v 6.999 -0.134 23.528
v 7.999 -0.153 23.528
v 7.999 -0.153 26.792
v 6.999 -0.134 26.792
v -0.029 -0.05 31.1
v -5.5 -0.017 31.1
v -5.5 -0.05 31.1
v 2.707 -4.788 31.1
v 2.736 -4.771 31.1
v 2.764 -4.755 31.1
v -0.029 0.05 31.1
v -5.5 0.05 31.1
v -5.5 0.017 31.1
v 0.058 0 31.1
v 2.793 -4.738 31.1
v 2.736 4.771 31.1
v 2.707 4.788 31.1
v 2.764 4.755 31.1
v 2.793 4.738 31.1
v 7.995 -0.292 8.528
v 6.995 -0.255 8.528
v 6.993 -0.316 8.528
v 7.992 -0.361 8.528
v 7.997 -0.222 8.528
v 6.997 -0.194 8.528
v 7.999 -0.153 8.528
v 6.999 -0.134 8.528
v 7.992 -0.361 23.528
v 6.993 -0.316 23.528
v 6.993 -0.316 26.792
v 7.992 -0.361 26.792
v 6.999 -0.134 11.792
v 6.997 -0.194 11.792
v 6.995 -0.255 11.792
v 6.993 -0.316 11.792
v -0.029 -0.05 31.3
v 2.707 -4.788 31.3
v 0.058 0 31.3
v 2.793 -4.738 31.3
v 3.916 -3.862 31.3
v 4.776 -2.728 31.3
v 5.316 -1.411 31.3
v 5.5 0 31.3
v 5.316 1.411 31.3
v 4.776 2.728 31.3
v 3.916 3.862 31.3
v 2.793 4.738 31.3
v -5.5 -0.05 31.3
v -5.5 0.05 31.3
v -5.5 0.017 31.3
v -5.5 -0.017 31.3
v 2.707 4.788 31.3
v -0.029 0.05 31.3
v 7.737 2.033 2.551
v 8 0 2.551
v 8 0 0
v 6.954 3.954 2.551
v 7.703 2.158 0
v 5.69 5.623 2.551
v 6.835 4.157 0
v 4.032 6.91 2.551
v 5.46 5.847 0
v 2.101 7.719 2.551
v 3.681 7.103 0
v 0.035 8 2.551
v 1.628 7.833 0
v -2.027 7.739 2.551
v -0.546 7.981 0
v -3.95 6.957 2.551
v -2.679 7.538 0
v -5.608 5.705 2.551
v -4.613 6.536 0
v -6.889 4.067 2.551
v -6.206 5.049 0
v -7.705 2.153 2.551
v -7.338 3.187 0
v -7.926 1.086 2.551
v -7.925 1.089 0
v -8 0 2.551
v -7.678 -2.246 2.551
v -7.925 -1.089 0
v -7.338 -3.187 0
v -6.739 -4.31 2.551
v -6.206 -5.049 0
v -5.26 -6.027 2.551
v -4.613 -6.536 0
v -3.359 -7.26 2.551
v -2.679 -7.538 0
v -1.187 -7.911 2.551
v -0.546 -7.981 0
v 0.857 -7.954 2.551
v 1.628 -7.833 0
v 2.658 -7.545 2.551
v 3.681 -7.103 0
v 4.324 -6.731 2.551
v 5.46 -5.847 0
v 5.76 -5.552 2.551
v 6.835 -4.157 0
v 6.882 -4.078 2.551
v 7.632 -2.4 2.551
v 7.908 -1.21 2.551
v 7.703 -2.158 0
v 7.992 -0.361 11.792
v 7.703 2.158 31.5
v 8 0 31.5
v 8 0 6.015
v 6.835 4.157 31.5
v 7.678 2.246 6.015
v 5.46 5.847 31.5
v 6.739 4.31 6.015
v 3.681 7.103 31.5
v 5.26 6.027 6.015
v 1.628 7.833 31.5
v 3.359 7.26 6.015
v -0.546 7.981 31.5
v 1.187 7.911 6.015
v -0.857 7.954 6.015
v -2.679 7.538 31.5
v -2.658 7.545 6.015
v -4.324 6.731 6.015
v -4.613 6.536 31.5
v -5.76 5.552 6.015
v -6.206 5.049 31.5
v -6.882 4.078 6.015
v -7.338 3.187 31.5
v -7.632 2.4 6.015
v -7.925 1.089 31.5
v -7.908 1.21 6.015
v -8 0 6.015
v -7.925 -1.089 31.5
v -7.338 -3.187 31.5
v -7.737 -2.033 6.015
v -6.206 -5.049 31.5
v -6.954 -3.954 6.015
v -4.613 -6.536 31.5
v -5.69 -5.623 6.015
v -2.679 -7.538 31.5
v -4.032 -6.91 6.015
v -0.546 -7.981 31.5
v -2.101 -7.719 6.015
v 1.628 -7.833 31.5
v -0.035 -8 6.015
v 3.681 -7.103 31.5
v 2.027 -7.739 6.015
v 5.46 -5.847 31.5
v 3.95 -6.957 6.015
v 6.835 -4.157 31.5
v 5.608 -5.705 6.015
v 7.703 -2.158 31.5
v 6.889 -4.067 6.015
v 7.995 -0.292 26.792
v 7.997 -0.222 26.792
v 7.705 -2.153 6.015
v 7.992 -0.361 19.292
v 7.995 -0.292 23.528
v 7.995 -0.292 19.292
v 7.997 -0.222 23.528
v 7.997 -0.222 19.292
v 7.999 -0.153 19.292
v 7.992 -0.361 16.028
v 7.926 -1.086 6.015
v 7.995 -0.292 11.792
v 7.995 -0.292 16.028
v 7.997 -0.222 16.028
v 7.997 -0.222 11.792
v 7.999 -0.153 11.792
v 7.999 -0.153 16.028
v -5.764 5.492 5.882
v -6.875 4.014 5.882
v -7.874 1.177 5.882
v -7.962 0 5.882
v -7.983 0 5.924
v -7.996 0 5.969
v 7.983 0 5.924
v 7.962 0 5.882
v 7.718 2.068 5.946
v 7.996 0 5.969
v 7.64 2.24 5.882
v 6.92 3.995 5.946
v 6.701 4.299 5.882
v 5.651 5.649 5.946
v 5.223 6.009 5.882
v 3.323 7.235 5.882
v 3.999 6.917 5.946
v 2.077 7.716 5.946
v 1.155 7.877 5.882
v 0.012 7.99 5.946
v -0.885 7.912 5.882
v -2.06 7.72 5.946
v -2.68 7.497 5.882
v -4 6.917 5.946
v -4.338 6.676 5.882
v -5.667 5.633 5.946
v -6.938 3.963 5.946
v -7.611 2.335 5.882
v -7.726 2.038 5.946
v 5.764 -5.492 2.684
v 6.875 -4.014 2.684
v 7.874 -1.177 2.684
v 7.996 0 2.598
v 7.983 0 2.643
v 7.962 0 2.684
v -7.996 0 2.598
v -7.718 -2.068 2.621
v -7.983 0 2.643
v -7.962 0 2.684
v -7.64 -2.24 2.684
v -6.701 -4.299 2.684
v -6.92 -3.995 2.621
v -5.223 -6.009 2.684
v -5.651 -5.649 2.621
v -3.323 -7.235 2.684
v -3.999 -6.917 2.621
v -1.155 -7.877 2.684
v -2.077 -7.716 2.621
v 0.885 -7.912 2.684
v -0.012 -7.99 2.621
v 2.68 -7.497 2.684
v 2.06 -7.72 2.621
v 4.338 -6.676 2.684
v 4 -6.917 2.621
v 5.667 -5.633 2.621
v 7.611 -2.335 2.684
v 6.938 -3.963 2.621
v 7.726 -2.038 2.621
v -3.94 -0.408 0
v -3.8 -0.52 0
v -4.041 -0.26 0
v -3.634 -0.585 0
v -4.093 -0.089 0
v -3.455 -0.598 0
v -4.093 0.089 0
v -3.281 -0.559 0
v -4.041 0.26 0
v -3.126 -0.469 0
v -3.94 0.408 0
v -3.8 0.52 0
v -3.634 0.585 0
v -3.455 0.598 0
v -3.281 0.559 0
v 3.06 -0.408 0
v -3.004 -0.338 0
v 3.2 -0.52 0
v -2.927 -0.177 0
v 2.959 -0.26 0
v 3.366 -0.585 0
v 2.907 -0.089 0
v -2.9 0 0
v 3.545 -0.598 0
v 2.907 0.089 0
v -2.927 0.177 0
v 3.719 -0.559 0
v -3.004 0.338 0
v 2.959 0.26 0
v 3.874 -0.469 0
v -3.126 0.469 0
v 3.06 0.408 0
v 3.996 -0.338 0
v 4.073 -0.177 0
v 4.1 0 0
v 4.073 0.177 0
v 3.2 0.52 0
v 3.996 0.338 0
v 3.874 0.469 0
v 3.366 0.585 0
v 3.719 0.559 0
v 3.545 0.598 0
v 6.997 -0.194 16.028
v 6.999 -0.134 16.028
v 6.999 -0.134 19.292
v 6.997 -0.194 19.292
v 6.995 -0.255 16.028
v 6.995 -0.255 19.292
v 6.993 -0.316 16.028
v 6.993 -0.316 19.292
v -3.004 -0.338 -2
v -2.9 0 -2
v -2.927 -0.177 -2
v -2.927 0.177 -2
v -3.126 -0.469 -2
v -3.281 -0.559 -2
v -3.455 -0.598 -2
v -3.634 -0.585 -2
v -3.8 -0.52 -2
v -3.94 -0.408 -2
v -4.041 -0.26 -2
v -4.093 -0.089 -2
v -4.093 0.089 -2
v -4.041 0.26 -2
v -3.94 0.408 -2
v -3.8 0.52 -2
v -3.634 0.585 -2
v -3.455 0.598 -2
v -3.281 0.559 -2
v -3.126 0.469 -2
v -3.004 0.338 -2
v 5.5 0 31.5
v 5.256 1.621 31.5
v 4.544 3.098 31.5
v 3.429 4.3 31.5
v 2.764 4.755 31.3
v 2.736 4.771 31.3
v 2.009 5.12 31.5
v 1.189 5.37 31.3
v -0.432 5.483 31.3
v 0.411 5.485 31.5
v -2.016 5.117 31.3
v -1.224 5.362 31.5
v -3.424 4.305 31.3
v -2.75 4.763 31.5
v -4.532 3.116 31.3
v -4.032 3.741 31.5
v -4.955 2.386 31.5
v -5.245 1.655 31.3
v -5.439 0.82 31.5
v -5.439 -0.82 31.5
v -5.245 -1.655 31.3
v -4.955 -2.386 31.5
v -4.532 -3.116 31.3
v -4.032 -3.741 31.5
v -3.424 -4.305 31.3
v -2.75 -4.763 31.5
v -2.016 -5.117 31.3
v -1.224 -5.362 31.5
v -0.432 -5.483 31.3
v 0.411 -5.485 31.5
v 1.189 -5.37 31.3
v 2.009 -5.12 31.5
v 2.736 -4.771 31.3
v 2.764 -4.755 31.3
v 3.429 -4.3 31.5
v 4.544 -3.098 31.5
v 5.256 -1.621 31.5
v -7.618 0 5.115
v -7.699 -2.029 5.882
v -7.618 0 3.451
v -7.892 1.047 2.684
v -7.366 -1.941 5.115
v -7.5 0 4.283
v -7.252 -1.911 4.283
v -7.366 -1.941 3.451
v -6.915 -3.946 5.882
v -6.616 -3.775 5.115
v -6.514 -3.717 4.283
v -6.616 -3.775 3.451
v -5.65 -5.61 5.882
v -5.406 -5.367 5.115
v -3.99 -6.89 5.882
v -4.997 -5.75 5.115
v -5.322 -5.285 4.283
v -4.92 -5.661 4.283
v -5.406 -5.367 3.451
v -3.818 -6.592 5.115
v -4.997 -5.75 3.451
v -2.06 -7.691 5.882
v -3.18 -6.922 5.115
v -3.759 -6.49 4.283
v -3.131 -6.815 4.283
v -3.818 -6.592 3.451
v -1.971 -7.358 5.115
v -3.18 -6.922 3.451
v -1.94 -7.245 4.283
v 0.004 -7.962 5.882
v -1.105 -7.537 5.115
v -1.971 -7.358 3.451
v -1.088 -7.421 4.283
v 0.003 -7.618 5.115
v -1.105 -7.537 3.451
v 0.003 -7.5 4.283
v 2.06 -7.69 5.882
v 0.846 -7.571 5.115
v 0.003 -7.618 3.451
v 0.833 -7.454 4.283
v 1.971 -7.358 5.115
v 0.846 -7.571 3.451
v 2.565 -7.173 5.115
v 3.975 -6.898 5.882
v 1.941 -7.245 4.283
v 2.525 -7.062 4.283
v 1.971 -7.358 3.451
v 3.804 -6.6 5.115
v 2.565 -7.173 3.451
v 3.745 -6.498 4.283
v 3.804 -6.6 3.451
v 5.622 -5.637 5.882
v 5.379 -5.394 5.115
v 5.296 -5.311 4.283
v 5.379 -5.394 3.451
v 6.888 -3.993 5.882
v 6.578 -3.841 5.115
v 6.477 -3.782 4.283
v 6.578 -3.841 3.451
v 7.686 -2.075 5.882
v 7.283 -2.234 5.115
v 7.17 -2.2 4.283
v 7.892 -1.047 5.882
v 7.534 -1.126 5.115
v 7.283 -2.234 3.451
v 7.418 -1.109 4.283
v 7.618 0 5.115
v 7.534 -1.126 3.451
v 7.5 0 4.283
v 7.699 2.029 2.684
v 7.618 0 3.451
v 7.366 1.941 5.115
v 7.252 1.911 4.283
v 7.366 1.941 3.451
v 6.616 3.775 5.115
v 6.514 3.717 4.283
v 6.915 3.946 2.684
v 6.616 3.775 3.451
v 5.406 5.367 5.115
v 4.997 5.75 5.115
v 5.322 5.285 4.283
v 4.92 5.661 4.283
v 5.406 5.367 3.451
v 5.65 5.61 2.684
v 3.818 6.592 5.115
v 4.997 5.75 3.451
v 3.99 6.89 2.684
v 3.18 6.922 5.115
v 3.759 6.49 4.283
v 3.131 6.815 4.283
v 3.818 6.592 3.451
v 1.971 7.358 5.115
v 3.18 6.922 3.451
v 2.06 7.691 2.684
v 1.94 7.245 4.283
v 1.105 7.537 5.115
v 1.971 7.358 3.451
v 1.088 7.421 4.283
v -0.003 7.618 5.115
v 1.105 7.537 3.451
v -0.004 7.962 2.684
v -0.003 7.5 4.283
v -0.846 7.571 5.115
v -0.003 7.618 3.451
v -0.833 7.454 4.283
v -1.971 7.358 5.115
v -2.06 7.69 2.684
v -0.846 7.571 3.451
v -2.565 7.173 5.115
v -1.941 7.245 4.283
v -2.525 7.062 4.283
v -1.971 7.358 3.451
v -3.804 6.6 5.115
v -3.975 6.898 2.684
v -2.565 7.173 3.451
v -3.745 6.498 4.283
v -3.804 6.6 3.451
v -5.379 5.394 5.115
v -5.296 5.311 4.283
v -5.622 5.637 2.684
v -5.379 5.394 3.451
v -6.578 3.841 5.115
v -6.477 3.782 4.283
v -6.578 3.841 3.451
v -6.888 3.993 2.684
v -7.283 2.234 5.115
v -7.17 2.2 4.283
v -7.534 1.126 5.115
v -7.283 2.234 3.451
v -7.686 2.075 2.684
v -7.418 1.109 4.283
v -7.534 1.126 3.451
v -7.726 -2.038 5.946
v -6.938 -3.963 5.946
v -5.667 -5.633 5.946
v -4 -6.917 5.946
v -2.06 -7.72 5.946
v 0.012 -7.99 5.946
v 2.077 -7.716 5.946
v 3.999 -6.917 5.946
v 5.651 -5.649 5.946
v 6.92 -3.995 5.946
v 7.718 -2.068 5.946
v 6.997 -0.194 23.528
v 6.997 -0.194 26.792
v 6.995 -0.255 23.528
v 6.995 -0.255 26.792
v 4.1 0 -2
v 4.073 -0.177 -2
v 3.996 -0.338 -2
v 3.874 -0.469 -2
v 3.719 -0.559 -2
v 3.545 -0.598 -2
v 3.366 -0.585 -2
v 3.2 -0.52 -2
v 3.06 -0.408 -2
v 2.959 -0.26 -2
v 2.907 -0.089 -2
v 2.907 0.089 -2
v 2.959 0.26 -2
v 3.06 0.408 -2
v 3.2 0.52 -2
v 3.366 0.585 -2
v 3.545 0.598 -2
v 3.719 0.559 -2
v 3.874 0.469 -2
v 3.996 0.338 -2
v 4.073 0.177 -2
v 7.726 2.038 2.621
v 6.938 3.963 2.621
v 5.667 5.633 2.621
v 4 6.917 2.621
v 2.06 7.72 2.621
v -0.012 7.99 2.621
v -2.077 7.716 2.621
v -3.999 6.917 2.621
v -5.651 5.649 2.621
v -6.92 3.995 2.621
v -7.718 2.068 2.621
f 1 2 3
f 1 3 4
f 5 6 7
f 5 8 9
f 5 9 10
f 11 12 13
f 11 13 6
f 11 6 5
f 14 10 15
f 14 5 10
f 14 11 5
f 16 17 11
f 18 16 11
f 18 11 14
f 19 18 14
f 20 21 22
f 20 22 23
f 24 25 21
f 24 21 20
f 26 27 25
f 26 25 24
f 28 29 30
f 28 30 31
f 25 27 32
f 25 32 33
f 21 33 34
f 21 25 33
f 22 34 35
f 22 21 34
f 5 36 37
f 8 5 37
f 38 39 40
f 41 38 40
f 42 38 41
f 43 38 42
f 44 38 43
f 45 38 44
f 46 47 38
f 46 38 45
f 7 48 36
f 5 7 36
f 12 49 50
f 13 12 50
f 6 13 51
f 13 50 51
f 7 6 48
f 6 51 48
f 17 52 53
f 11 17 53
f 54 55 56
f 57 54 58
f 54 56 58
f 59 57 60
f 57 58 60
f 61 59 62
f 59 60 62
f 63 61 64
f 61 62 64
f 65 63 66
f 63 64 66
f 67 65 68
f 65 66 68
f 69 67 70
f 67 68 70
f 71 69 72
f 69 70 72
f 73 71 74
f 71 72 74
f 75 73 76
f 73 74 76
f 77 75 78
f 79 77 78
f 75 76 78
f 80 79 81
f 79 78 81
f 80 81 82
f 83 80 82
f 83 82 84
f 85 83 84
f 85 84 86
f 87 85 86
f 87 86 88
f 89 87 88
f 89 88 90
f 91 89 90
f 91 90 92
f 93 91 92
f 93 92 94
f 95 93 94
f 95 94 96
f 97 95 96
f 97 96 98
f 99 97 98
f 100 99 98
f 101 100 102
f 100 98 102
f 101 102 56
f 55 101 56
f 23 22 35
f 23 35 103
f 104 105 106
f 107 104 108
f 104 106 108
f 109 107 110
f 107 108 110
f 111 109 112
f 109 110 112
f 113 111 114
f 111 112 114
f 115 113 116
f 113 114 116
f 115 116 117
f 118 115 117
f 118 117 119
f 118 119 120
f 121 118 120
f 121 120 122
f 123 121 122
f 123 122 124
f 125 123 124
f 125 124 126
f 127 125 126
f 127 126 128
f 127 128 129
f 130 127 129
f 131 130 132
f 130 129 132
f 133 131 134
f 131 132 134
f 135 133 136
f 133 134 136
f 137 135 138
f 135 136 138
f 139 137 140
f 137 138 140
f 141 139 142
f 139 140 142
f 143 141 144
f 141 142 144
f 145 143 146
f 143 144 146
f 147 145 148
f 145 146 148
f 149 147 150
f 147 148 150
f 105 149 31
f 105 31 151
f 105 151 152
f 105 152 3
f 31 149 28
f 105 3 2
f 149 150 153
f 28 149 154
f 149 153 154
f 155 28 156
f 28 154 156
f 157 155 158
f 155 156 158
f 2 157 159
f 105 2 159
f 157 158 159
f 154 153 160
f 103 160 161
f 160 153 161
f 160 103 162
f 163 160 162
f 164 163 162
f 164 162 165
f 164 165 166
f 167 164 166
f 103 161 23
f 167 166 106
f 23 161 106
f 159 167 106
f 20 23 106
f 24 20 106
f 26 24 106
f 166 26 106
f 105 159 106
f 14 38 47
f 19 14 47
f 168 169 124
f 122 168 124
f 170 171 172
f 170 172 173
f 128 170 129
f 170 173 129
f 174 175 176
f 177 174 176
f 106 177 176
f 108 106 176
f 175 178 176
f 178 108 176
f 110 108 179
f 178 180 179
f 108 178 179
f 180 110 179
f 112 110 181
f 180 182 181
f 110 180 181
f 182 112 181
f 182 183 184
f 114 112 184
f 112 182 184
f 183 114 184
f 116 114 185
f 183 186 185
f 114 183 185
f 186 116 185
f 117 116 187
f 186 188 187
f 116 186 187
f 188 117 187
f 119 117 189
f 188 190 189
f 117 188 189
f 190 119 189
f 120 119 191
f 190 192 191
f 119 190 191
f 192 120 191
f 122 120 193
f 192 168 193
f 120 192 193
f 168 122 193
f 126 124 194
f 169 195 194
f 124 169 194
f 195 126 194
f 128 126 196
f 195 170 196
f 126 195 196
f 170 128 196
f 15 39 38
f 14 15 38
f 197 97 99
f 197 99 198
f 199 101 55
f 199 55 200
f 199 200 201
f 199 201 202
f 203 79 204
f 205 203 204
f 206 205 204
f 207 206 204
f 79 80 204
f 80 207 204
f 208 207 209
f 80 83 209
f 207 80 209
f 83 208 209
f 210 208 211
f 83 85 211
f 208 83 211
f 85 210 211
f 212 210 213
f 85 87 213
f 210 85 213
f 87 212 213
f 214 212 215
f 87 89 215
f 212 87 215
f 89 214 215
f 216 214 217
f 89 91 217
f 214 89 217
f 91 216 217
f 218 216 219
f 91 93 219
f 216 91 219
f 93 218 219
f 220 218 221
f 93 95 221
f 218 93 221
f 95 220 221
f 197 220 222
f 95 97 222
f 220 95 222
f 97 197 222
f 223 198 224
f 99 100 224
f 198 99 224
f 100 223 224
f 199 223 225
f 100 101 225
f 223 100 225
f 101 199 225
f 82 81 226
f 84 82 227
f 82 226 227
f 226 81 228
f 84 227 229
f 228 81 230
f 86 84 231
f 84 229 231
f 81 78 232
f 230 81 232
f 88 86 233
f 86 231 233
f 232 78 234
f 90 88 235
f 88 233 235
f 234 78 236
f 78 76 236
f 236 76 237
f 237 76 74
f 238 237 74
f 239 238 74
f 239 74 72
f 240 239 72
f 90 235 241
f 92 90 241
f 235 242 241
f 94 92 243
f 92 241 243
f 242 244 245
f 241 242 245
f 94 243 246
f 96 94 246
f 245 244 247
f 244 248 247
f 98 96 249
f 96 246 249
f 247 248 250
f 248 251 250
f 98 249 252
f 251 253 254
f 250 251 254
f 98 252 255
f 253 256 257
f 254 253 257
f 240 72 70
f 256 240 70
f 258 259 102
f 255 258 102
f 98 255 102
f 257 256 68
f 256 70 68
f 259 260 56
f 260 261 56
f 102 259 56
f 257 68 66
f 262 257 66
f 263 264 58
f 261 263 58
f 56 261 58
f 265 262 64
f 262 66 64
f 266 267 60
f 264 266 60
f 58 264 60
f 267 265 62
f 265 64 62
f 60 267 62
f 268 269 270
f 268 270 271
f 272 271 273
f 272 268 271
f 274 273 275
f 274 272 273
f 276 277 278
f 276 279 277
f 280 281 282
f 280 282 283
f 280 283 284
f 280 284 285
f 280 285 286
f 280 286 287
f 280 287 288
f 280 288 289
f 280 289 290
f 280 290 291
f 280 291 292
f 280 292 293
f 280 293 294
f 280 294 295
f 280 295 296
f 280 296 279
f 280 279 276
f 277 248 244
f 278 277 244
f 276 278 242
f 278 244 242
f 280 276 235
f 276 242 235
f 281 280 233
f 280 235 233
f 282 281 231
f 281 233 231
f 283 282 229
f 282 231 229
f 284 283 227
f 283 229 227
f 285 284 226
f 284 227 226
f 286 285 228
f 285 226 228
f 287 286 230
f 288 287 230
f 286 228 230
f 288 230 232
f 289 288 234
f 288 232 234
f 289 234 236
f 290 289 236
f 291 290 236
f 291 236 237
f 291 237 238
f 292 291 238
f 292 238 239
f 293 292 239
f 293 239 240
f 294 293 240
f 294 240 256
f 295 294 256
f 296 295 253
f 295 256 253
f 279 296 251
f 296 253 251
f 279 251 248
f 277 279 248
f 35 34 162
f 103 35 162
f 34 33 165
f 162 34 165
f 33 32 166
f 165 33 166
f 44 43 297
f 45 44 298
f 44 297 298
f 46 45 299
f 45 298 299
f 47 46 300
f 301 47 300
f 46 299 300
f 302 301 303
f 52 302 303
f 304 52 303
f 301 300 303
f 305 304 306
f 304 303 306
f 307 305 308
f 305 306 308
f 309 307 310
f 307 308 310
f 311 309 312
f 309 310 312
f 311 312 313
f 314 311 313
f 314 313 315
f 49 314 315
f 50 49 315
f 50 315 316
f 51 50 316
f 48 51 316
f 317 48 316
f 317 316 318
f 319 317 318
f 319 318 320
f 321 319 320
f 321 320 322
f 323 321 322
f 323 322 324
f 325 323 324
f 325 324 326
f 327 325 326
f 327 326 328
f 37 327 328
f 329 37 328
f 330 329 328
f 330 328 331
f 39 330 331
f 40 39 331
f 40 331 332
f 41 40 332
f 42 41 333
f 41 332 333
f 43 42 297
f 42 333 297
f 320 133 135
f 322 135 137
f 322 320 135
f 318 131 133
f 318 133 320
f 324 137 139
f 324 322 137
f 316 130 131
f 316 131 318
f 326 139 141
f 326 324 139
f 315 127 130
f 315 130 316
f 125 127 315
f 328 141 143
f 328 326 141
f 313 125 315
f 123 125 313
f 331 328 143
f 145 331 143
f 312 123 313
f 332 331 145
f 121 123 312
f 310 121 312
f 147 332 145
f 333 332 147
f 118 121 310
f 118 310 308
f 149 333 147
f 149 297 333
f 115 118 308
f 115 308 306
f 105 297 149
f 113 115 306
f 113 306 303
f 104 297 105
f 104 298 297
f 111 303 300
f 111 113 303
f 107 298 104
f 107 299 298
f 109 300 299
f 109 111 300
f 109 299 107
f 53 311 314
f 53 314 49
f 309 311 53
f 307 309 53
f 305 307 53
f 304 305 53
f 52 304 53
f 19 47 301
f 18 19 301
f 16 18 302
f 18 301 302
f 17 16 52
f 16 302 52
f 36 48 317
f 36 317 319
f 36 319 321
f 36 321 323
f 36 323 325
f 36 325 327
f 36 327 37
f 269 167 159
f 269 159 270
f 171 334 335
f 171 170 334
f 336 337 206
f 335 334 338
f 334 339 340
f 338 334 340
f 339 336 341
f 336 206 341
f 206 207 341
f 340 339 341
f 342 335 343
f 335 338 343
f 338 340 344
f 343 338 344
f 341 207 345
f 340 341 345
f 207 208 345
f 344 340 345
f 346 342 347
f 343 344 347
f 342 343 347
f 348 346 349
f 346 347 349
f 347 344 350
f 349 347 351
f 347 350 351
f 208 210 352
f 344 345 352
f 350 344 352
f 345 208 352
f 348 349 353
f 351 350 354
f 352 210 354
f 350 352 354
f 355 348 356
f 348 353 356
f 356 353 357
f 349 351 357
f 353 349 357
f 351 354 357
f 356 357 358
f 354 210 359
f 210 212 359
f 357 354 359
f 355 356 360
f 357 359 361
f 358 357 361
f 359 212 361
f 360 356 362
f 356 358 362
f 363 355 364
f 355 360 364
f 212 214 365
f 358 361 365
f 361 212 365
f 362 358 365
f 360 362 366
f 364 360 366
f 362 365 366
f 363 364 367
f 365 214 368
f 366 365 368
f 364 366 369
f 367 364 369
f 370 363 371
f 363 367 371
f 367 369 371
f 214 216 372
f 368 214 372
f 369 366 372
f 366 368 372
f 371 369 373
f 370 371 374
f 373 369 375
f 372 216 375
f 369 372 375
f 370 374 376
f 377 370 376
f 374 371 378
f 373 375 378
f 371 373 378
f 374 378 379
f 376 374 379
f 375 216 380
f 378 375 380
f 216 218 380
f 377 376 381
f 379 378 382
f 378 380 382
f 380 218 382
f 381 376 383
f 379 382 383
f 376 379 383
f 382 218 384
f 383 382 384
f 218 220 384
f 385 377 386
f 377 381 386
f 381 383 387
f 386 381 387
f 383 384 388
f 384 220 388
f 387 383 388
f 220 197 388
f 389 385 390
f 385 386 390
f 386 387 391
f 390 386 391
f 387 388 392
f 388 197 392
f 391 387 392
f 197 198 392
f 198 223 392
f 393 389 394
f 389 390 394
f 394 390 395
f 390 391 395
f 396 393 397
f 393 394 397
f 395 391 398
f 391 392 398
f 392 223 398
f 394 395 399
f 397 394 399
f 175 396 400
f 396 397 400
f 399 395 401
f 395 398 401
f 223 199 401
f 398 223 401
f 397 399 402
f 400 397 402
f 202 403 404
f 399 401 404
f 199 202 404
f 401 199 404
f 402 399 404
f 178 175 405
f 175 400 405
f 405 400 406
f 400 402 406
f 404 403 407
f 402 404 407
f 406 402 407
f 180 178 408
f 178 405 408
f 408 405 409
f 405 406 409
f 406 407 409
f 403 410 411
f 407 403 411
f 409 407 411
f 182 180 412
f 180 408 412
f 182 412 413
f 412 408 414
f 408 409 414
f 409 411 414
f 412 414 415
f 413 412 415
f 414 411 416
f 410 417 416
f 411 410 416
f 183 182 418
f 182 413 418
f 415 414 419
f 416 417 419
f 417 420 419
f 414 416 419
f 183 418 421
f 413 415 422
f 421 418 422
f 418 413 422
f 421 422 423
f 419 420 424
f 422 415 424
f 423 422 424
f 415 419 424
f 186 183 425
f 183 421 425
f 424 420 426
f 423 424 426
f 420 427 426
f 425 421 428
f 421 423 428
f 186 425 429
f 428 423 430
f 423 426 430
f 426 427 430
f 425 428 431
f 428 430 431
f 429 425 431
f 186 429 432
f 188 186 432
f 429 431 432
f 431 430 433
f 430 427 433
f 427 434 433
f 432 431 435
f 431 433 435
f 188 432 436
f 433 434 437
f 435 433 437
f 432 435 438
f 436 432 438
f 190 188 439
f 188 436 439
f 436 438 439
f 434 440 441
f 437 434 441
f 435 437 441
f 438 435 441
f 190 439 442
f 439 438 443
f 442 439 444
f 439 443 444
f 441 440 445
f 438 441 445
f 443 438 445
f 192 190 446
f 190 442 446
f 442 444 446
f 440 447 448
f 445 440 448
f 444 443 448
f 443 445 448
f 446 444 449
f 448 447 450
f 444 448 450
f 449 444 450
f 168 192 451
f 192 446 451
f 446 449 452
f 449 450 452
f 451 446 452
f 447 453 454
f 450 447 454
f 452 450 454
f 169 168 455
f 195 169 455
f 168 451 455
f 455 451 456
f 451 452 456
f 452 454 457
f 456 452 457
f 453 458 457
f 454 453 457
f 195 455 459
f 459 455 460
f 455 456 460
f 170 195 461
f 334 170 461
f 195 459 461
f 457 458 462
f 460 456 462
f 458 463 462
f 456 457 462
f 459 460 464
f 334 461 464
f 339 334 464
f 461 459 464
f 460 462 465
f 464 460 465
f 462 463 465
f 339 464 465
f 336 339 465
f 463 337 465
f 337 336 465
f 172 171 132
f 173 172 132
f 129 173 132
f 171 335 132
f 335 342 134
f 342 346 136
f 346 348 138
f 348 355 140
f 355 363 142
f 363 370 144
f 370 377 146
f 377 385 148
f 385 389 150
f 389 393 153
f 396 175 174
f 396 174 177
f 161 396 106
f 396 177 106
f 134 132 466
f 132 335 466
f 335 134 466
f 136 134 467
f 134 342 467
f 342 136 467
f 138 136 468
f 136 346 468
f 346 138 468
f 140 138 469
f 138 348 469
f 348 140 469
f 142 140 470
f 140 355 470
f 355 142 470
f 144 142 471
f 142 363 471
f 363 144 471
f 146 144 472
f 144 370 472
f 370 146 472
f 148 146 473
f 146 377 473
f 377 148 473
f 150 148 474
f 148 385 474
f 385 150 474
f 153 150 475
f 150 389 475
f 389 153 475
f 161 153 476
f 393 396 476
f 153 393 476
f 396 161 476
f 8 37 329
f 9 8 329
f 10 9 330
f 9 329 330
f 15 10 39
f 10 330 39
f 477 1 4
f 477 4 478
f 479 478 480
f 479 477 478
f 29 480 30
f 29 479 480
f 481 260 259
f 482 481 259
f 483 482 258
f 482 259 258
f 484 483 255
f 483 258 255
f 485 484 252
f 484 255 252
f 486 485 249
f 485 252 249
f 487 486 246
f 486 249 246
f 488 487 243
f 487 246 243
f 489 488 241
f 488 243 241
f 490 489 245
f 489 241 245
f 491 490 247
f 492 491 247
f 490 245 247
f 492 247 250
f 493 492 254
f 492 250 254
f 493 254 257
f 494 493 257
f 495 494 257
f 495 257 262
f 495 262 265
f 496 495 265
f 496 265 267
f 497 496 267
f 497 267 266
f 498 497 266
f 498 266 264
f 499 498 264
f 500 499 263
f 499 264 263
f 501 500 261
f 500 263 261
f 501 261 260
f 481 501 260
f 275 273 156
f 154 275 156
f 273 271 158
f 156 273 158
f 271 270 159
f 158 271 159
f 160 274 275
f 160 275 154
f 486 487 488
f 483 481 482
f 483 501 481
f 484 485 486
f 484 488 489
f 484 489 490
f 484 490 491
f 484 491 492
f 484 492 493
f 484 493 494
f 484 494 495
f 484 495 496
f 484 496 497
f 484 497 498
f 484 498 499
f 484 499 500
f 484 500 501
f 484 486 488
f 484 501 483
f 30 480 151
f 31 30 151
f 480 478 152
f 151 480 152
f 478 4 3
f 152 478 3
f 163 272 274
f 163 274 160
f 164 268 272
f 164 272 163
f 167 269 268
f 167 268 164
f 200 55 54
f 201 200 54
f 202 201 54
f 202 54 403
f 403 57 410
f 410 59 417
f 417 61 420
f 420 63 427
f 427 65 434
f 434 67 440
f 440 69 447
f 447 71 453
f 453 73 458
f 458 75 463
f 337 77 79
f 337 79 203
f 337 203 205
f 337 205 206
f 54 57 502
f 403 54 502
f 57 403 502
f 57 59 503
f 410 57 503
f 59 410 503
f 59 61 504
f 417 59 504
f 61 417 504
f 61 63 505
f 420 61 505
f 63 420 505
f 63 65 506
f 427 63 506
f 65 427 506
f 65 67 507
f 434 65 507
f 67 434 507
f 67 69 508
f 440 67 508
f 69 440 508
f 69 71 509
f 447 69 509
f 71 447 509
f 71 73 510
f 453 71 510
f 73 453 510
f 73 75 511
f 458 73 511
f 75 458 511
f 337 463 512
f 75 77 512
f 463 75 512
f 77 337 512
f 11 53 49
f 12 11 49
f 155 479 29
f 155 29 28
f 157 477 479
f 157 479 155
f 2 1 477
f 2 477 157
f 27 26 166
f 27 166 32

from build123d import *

# Parameters (mm, degrees)
SKETCH_1_R          = 8
EXTRUDE_1_DEPTH     = 31.5
SKETCH_2_R          = 5.5
CUT_EXTRUDE_1_DEPTH = 0.2
CUT_EXTRUDE_2_DEPTH = 0.2
FILLET_1_R          = 0.25
SKETCH_5_R          = 0.6
EXTRUDE_2_DEPTH     = 2
WRAP_START          = 8.527777778
WRAP_2_DEPTH        = 3.263888889
WRAP_START_2        = 16.027777778
WRAP_2_2_DEPTH      = 3.263888889
WRAP_START_3        = 23.527777778
WRAP_2_3_DEPTH      = 3.263888889


# Read off the part's stored shape, not the designer's step: 包覆2
with BuildPart() as part:
    # 草图1 → 凸台-拉伸1 (new body)
    with BuildSketch(Plane.XY):
        Circle(SKETCH_1_R)
    extrude(amount=EXTRUDE_1_DEPTH)

    # 草图2 → 切除-拉伸1 (cut)
    with BuildSketch(Plane.XY.offset(31.5)):
        Circle(SKETCH_2_R)
    extrude(amount=-CUT_EXTRUDE_1_DEPTH, mode=Mode.SUBTRACT)

    # 草图3 → 切除-拉伸2 (cut)
    with BuildSketch(Plane.XY.offset(31.3)):
        with BuildLine():
            Line((-0.04330127, 0.025), (-0.028867513, 0.05))
            Line((-0.028867513, 0.05), (-5.499772723, 0.05))
            ThreePointArc((-5.499772723, 0.05), (-5.5, 0), (-5.499772723, -0.05))
            Line((-5.499772723, -0.05), (-0.028867513, -0.05))
            Line((-0.028867513, -0.05), (-0.04330127, -0.025))
            Line((-0.04330127, -0.025), (0, 0))
            Line((0, 0), (-0.04330127, 0.025))
        make_face()
        with BuildLine():
            Line((0.04330127, -0.025), (0, 0))
            Line((0, 0), (0, -0.05))
            Line((0, -0.05), (-0.028867513, -0.05))
            Line((-0.028867513, -0.05), (2.706585091, -4.787942893))
            ThreePointArc((2.706585091, -4.787942893), (2.75, -4.763139721), (2.793187631, -4.737942893))
            Line((2.793187631, -4.737942893), (0.057735027, 0))
            Line((0.057735027, 0), (0.04330127, -0.025))
        make_face()
        with BuildLine():
            Line((-0.028867513, 0.05), (0, 0.05))
            Line((0, 0.05), (0, 0))
            Line((0, 0), (0.04330127, 0.025))
            Line((0.04330127, 0.025), (0.057735027, 0))
            Line((0.057735027, 0), (2.793187631, 4.737942893))
            ThreePointArc((2.793187631, 4.737942893), (2.75, 4.763139721), (2.706585091, 4.787942893))
            Line((2.706585091, 4.787942893), (-0.028867513, 0.05))
        make_face()
        Polygon((0, 0), (0, 0.05), (-0.028867513, 0.05), (-0.04330127, 0.025), align=None)
        Polygon((0, -0.05), (0, 0), (-0.04330127, -0.025), (-0.028867513, -0.05), align=None)
        Polygon((0.04330127, 0.025), (0, 0), (0.04330127, -0.025), (0.057735027, 0), align=None)
    extrude(amount=-CUT_EXTRUDE_2_DEPTH, mode=Mode.SUBTRACT)

    # 草图4 → 切除-旋转1 (revolve, cut)
    with BuildSketch(Plane(origin=(0, 0, 0), x_dir=(1, 0, 0), z_dir=(0, 1, 0))):
        with BuildLine():
            Line((-8.318421305, -2.223982894), (-8.318421305, -6.342581877))
            ThreePointArc((-8.318421305, -6.342581877), (-7.5, -4.283282386), (-8.318421305, -2.223982894))
        make_face()
    revolve(axis=Axis((0, 0, 0), (0, 0, 1)), mode=Mode.SUBTRACT)

    # 圆角1
    fillet_1_edges = [part.edges().sort_by_distance(p)[0] for p in [
        (0, 8, 5.941594781),
        (0, -8, 2.62496999),
    ]]
    fillet(fillet_1_edges, radius=FILLET_1_R)

    # 草图5 → 凸台-拉伸2 (add)
    with BuildSketch(Plane(origin=(0, 0, 0), x_dir=(-1, 0, 0), z_dir=(0, 0, -1))):
        with Locations(Location((3.5, 0, 0), (0, 0, 180))):
            Circle(SKETCH_5_R)
        with Locations(Location((-3.5, 0, 0), (0, 0, 180))):
            Circle(SKETCH_5_R)
    extrude(amount=EXTRUDE_2_DEPTH)

    # 包覆2 outline → 包覆2 (cut)
    with BuildSketch(Plane.XY.offset(WRAP_START)):
        with BuildLine():
            Line((7.998541229, -0.152768492), (6.998723575, -0.13367243))
            ThreePointArc((6.998723575, -0.13367243), (6.996389817, -0.224787737), (6.992869893, -0.315864933))
            Line((6.992869893, -0.315864933), (7.991851307, -0.360988495))
            ThreePointArc((7.991851307, -0.360988495), (7.995874077, -0.256900271), (7.998541229, -0.152768492))
        make_face()
    extrude(amount=WRAP_2_DEPTH, mode=Mode.SUBTRACT)

    # Wrap 2 2 outline → Wrap 2 2 (cut)
    with BuildSketch(Plane.XY.offset(WRAP_START_2)):
        with BuildLine():
            Line((7.998541229, -0.152768492), (6.998723575, -0.13367243))
            ThreePointArc((6.998723575, -0.13367243), (6.996389817, -0.224787737), (6.992869893, -0.315864933))
            Line((6.992869893, -0.315864933), (7.991851307, -0.360988495))
            ThreePointArc((7.991851307, -0.360988495), (7.995874077, -0.256900271), (7.998541229, -0.152768492))
        make_face()
    extrude(amount=WRAP_2_2_DEPTH, mode=Mode.SUBTRACT)

    # Wrap 2 3 outline → Wrap 2 3 (cut)
    with BuildSketch(Plane.XY.offset(WRAP_START_3)):
        with BuildLine():
            Line((7.998541229, -0.152768492), (6.998723575, -0.13367243))
            ThreePointArc((6.998723575, -0.13367243), (6.996389817, -0.224787737), (6.992869893, -0.315864933))
            Line((6.992869893, -0.315864933), (7.991851307, -0.360988495))
            ThreePointArc((7.991851307, -0.360988495), (7.995874077, -0.256900271), (7.998541229, -0.152768492))
        make_face()
    extrude(amount=WRAP_2_3_DEPTH, mode=Mode.SUBTRACT)


solid = part.part
